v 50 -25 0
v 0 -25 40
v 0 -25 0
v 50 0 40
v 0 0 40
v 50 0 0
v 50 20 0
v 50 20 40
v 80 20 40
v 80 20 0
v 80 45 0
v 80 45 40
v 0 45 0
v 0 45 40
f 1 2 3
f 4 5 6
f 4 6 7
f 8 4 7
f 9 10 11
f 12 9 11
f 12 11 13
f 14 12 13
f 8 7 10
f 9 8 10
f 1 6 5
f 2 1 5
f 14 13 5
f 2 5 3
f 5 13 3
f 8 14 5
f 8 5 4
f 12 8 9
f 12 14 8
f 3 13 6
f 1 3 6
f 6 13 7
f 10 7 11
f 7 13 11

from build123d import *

# Parameters (mm, degrees)
F1_DEPTH = 25
F3_DEPTH = 40


with BuildPart() as f1:
    # F0 (on Front) → F1 (new body)
    with BuildSketch(Plane.XZ):
        Polygon((0, 40), (0, 0), (50, 0), align=None)
    extrude(amount=F1_DEPTH)

    # F2 (on Top) → F3 (join)
    with BuildSketch(Plane.XY):
        Polygon((0, 45), (0, 0), (50, 0), (50, 20), (80, 20), (80, 45), align=None)
    extrude(amount=F3_DEPTH)


solid = f1.part
